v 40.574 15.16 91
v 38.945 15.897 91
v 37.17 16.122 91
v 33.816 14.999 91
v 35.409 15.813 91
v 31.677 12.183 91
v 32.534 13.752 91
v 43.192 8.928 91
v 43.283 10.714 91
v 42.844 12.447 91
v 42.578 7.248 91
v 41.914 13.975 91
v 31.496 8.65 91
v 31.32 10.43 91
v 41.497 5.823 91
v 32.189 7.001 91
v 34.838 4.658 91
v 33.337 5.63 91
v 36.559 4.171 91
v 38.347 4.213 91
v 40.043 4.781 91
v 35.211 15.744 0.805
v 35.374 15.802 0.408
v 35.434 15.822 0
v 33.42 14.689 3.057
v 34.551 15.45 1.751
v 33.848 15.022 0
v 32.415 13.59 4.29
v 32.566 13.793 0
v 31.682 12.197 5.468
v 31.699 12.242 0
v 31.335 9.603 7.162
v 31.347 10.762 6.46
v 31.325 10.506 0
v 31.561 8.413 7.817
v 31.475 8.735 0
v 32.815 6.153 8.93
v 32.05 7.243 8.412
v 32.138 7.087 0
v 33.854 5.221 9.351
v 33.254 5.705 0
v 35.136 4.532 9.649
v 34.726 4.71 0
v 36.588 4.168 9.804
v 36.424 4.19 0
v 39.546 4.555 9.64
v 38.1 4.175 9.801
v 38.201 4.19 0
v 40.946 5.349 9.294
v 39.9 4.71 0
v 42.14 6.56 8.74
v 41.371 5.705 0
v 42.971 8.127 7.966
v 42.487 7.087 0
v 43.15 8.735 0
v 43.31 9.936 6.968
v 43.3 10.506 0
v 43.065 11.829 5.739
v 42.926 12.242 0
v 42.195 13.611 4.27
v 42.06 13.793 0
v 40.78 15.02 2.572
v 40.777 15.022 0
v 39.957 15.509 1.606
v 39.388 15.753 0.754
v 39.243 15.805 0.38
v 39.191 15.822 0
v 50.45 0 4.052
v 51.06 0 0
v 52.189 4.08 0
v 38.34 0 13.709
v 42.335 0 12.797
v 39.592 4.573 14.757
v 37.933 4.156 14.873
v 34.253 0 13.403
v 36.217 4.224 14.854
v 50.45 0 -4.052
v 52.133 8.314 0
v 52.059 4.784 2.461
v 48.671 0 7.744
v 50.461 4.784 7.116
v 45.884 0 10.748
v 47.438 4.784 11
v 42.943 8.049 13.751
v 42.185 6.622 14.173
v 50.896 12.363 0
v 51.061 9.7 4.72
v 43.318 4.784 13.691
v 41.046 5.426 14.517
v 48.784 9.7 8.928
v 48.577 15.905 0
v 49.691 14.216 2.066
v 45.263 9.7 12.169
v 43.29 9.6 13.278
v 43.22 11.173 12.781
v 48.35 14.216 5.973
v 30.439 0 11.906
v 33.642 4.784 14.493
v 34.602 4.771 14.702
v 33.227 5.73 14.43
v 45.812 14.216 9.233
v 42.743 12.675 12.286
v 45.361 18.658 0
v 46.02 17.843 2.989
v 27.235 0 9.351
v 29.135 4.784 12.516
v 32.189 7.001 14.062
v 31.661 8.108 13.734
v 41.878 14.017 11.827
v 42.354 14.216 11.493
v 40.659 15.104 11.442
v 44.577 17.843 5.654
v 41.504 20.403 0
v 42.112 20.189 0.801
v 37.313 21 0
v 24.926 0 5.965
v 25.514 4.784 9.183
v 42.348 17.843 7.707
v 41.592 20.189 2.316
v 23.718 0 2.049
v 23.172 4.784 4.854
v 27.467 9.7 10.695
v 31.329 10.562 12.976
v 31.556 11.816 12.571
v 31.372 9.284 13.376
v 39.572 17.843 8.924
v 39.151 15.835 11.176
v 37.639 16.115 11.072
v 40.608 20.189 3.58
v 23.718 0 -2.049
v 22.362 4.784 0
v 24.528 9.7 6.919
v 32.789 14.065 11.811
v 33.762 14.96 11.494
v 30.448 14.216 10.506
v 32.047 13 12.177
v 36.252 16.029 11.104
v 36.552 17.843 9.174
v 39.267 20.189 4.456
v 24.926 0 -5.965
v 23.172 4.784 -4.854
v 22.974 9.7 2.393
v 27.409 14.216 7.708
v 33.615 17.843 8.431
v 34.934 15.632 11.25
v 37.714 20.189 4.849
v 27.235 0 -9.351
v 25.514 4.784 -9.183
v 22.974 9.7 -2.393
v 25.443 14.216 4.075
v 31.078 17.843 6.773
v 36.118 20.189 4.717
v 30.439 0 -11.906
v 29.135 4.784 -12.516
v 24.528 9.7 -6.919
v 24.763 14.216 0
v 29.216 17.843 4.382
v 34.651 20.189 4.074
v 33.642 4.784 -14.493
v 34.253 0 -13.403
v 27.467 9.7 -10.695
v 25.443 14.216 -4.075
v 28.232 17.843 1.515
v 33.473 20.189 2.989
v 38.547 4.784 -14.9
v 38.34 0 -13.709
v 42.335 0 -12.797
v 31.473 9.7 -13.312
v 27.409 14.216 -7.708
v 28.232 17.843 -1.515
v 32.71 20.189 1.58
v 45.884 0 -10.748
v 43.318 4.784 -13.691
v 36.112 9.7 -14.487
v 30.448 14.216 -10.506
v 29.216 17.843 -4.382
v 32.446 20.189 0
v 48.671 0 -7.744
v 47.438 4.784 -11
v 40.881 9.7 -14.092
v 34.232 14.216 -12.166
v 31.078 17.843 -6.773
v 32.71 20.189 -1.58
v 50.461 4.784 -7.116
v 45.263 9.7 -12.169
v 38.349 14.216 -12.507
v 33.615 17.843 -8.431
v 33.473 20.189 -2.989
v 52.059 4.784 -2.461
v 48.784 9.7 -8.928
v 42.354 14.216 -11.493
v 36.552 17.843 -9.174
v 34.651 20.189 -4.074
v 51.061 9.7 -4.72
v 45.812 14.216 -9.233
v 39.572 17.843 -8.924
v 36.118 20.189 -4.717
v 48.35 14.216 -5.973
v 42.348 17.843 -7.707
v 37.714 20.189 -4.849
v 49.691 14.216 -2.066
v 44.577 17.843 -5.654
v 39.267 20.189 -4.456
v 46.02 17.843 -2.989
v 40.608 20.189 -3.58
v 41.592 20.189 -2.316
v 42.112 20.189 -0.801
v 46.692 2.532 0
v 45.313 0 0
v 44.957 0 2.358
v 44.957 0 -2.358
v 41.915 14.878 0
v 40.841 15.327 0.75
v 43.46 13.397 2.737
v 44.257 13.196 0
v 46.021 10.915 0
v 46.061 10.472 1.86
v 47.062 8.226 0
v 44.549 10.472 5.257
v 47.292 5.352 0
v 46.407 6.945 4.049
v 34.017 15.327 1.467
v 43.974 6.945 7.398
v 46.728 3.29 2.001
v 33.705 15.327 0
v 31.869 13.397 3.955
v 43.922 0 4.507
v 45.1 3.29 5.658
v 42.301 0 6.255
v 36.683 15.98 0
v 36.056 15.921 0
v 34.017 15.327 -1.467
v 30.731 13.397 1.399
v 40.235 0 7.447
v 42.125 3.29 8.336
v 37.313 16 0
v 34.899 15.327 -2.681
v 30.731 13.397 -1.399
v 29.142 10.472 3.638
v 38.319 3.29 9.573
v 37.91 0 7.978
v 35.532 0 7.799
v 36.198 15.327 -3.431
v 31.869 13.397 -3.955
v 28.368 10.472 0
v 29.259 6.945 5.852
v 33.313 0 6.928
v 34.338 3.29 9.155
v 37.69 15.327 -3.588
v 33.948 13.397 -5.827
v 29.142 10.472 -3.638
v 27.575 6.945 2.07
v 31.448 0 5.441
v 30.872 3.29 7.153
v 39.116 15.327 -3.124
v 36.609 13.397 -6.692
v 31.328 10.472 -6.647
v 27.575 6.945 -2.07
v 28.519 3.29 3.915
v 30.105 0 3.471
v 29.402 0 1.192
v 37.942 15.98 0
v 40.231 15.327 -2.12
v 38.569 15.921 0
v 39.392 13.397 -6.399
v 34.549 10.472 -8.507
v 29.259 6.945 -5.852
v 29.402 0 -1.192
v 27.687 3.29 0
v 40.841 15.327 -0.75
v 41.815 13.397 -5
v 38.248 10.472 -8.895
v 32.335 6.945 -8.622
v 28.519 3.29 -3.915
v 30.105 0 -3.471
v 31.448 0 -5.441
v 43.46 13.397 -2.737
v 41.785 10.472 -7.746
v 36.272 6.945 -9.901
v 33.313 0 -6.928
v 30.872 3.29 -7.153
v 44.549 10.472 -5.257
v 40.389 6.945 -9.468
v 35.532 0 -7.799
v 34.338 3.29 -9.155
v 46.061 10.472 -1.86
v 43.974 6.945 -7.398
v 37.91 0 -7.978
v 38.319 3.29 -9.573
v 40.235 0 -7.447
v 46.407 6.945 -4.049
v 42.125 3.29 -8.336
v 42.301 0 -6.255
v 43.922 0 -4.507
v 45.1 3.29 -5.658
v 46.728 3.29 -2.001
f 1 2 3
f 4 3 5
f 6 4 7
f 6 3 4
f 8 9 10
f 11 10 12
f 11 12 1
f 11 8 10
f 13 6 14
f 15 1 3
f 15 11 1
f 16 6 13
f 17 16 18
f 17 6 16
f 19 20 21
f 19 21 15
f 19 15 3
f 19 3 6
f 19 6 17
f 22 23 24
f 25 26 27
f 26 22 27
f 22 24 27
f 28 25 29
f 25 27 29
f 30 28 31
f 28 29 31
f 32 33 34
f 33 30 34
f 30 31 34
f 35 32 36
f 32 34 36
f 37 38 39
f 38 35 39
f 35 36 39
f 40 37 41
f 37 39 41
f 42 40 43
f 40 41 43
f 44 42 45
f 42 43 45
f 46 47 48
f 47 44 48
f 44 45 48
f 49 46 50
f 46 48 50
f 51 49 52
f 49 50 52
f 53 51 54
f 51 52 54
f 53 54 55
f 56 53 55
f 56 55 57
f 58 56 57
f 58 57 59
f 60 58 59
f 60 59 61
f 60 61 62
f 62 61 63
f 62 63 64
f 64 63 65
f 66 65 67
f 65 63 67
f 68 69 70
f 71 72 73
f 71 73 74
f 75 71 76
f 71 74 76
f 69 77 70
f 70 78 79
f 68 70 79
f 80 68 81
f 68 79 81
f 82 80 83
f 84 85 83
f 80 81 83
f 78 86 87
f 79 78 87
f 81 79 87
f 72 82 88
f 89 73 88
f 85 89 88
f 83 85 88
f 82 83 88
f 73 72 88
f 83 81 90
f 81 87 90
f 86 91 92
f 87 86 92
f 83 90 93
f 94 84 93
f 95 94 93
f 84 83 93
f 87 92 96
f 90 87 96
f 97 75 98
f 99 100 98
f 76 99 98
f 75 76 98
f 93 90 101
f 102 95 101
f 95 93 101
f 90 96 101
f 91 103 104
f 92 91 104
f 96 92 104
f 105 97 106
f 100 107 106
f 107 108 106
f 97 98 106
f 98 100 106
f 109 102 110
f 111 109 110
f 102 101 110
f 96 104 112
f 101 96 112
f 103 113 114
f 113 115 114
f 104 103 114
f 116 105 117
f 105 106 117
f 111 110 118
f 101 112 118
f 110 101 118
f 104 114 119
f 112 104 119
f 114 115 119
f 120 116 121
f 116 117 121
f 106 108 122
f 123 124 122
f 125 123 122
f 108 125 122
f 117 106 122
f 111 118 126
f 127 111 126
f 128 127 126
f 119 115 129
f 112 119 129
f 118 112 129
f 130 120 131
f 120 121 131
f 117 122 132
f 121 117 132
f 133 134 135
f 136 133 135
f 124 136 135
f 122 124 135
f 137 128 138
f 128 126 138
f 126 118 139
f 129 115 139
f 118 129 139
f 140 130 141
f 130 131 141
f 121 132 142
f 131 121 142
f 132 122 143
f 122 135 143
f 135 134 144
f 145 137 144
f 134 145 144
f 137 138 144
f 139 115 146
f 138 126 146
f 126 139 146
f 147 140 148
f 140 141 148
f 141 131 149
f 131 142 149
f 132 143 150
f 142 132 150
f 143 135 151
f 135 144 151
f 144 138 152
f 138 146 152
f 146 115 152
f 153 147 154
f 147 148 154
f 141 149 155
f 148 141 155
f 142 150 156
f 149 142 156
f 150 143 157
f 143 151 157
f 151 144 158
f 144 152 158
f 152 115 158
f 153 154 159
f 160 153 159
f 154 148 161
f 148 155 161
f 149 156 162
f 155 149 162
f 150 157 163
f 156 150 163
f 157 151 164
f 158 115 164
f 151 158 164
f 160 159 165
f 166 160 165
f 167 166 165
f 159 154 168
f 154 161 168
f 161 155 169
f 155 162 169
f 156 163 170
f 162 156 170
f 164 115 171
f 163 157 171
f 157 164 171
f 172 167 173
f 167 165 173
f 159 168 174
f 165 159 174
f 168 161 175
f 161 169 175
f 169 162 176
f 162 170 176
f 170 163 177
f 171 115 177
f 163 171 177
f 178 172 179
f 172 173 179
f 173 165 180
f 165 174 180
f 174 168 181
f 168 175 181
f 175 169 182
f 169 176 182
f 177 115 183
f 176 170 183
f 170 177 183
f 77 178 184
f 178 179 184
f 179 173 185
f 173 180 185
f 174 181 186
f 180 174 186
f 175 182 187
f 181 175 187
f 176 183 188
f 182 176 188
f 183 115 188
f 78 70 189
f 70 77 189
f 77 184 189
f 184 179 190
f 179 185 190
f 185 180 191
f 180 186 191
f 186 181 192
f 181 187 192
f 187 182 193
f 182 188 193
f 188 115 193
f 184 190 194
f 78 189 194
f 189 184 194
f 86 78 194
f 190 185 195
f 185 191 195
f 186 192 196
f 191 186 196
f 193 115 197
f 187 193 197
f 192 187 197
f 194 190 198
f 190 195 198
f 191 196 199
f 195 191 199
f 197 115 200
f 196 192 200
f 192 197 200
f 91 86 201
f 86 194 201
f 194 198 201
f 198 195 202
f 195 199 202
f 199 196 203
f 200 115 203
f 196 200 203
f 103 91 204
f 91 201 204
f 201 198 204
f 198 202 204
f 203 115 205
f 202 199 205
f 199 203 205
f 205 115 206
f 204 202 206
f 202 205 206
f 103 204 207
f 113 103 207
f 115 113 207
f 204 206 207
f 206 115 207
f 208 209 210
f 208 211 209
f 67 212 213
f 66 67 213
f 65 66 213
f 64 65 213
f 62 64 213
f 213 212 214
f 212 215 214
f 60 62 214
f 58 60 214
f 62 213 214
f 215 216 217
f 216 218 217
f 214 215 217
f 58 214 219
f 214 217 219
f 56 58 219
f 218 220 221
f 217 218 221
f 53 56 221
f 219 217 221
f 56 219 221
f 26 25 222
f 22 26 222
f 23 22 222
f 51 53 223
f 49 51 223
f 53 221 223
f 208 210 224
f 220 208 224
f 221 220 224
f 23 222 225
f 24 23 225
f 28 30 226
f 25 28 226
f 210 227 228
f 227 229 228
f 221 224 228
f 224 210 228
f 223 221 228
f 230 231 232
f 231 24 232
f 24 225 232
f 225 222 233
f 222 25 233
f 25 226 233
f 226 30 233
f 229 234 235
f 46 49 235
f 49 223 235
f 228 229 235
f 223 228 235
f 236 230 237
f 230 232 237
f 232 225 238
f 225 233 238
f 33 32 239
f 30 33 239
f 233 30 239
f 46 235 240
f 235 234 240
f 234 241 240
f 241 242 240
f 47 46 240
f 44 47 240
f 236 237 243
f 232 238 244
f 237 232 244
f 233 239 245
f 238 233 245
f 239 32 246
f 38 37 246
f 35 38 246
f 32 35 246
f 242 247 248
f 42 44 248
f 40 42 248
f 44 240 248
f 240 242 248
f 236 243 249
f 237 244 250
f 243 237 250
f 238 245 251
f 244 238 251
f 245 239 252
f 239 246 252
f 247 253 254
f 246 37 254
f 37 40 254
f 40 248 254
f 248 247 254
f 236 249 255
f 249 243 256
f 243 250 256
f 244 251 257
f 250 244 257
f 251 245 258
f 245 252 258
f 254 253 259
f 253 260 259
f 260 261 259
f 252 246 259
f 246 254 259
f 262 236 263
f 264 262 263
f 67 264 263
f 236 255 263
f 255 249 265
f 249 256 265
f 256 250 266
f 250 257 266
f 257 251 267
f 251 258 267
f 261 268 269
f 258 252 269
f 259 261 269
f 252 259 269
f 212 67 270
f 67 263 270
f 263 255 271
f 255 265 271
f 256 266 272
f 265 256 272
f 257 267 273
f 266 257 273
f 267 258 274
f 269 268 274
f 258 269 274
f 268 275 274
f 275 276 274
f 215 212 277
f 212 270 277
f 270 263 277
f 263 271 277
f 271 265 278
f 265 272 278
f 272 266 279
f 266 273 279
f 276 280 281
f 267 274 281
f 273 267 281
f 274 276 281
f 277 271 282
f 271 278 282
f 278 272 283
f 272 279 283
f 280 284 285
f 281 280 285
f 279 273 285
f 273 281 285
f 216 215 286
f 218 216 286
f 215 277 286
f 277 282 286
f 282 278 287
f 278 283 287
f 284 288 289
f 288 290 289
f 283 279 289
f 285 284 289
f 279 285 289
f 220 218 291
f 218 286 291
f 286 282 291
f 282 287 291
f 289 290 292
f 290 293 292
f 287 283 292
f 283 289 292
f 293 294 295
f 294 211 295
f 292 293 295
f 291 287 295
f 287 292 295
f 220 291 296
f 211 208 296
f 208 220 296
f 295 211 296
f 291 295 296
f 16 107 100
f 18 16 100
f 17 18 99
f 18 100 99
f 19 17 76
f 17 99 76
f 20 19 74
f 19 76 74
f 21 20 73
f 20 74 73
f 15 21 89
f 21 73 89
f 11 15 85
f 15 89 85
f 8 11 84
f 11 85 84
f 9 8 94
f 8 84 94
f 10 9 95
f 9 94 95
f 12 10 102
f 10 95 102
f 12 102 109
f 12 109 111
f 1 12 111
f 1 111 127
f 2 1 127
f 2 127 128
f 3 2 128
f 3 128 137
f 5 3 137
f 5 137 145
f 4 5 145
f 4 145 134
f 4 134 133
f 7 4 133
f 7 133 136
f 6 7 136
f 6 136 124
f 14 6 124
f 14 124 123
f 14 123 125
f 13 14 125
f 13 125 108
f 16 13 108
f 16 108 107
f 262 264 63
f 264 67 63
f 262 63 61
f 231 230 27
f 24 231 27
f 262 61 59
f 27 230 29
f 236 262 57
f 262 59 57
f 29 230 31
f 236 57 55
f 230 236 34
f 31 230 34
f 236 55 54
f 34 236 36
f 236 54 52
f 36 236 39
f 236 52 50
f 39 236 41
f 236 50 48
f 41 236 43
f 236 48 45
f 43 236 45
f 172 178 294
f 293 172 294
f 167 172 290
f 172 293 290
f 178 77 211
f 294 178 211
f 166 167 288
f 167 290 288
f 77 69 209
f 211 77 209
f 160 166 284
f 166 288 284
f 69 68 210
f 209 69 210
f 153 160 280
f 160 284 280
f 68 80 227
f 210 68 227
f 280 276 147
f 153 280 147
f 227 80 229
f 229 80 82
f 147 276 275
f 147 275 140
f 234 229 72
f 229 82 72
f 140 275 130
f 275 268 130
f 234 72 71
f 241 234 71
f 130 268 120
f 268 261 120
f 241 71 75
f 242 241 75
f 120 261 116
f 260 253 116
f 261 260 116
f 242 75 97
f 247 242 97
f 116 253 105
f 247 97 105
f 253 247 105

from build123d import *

# Parameters (mm, degrees)
SKETCH2_R           = 6
BOSS_EXTRUDE1_DEPTH = 91


with BuildPart() as part:
    # Sketch1 → Revolve1 (revolve)
    with BuildSketch(Plane.XY, mode=Mode.PRIVATE) as revolve1_sk:
        with BuildLine():
            ThreePointArc((37.312583507, 16), (28.368311597, 10.472135955), (29.312583507, 0))
            Line((29.312583507, 0), (23.564856422, 0))
            ThreePointArc((23.564856422, 0), (24.762683109, 14.215838363), (37.312583507, 21))
            Line((37.312583507, 21), (37.312583507, 16))
        make_face()
    revolve(revolve1_sk.sketch.rotate(Axis((37.312583507, 21, 0), (0, -1, 0)), 180), axis=Axis((37.312583507, 21, 0), (0, -1, 0)))

    # Sketch2 → Boss-Extrude1 (add)
    with BuildSketch(Plane.XY):
        with Locations(Location((37.312583507, 10.123565848, 0), (0, 0, 211.358745585))):
            Circle(SKETCH2_R)
    extrude(amount=BOSS_EXTRUDE1_DEPTH)


solid = part.part
